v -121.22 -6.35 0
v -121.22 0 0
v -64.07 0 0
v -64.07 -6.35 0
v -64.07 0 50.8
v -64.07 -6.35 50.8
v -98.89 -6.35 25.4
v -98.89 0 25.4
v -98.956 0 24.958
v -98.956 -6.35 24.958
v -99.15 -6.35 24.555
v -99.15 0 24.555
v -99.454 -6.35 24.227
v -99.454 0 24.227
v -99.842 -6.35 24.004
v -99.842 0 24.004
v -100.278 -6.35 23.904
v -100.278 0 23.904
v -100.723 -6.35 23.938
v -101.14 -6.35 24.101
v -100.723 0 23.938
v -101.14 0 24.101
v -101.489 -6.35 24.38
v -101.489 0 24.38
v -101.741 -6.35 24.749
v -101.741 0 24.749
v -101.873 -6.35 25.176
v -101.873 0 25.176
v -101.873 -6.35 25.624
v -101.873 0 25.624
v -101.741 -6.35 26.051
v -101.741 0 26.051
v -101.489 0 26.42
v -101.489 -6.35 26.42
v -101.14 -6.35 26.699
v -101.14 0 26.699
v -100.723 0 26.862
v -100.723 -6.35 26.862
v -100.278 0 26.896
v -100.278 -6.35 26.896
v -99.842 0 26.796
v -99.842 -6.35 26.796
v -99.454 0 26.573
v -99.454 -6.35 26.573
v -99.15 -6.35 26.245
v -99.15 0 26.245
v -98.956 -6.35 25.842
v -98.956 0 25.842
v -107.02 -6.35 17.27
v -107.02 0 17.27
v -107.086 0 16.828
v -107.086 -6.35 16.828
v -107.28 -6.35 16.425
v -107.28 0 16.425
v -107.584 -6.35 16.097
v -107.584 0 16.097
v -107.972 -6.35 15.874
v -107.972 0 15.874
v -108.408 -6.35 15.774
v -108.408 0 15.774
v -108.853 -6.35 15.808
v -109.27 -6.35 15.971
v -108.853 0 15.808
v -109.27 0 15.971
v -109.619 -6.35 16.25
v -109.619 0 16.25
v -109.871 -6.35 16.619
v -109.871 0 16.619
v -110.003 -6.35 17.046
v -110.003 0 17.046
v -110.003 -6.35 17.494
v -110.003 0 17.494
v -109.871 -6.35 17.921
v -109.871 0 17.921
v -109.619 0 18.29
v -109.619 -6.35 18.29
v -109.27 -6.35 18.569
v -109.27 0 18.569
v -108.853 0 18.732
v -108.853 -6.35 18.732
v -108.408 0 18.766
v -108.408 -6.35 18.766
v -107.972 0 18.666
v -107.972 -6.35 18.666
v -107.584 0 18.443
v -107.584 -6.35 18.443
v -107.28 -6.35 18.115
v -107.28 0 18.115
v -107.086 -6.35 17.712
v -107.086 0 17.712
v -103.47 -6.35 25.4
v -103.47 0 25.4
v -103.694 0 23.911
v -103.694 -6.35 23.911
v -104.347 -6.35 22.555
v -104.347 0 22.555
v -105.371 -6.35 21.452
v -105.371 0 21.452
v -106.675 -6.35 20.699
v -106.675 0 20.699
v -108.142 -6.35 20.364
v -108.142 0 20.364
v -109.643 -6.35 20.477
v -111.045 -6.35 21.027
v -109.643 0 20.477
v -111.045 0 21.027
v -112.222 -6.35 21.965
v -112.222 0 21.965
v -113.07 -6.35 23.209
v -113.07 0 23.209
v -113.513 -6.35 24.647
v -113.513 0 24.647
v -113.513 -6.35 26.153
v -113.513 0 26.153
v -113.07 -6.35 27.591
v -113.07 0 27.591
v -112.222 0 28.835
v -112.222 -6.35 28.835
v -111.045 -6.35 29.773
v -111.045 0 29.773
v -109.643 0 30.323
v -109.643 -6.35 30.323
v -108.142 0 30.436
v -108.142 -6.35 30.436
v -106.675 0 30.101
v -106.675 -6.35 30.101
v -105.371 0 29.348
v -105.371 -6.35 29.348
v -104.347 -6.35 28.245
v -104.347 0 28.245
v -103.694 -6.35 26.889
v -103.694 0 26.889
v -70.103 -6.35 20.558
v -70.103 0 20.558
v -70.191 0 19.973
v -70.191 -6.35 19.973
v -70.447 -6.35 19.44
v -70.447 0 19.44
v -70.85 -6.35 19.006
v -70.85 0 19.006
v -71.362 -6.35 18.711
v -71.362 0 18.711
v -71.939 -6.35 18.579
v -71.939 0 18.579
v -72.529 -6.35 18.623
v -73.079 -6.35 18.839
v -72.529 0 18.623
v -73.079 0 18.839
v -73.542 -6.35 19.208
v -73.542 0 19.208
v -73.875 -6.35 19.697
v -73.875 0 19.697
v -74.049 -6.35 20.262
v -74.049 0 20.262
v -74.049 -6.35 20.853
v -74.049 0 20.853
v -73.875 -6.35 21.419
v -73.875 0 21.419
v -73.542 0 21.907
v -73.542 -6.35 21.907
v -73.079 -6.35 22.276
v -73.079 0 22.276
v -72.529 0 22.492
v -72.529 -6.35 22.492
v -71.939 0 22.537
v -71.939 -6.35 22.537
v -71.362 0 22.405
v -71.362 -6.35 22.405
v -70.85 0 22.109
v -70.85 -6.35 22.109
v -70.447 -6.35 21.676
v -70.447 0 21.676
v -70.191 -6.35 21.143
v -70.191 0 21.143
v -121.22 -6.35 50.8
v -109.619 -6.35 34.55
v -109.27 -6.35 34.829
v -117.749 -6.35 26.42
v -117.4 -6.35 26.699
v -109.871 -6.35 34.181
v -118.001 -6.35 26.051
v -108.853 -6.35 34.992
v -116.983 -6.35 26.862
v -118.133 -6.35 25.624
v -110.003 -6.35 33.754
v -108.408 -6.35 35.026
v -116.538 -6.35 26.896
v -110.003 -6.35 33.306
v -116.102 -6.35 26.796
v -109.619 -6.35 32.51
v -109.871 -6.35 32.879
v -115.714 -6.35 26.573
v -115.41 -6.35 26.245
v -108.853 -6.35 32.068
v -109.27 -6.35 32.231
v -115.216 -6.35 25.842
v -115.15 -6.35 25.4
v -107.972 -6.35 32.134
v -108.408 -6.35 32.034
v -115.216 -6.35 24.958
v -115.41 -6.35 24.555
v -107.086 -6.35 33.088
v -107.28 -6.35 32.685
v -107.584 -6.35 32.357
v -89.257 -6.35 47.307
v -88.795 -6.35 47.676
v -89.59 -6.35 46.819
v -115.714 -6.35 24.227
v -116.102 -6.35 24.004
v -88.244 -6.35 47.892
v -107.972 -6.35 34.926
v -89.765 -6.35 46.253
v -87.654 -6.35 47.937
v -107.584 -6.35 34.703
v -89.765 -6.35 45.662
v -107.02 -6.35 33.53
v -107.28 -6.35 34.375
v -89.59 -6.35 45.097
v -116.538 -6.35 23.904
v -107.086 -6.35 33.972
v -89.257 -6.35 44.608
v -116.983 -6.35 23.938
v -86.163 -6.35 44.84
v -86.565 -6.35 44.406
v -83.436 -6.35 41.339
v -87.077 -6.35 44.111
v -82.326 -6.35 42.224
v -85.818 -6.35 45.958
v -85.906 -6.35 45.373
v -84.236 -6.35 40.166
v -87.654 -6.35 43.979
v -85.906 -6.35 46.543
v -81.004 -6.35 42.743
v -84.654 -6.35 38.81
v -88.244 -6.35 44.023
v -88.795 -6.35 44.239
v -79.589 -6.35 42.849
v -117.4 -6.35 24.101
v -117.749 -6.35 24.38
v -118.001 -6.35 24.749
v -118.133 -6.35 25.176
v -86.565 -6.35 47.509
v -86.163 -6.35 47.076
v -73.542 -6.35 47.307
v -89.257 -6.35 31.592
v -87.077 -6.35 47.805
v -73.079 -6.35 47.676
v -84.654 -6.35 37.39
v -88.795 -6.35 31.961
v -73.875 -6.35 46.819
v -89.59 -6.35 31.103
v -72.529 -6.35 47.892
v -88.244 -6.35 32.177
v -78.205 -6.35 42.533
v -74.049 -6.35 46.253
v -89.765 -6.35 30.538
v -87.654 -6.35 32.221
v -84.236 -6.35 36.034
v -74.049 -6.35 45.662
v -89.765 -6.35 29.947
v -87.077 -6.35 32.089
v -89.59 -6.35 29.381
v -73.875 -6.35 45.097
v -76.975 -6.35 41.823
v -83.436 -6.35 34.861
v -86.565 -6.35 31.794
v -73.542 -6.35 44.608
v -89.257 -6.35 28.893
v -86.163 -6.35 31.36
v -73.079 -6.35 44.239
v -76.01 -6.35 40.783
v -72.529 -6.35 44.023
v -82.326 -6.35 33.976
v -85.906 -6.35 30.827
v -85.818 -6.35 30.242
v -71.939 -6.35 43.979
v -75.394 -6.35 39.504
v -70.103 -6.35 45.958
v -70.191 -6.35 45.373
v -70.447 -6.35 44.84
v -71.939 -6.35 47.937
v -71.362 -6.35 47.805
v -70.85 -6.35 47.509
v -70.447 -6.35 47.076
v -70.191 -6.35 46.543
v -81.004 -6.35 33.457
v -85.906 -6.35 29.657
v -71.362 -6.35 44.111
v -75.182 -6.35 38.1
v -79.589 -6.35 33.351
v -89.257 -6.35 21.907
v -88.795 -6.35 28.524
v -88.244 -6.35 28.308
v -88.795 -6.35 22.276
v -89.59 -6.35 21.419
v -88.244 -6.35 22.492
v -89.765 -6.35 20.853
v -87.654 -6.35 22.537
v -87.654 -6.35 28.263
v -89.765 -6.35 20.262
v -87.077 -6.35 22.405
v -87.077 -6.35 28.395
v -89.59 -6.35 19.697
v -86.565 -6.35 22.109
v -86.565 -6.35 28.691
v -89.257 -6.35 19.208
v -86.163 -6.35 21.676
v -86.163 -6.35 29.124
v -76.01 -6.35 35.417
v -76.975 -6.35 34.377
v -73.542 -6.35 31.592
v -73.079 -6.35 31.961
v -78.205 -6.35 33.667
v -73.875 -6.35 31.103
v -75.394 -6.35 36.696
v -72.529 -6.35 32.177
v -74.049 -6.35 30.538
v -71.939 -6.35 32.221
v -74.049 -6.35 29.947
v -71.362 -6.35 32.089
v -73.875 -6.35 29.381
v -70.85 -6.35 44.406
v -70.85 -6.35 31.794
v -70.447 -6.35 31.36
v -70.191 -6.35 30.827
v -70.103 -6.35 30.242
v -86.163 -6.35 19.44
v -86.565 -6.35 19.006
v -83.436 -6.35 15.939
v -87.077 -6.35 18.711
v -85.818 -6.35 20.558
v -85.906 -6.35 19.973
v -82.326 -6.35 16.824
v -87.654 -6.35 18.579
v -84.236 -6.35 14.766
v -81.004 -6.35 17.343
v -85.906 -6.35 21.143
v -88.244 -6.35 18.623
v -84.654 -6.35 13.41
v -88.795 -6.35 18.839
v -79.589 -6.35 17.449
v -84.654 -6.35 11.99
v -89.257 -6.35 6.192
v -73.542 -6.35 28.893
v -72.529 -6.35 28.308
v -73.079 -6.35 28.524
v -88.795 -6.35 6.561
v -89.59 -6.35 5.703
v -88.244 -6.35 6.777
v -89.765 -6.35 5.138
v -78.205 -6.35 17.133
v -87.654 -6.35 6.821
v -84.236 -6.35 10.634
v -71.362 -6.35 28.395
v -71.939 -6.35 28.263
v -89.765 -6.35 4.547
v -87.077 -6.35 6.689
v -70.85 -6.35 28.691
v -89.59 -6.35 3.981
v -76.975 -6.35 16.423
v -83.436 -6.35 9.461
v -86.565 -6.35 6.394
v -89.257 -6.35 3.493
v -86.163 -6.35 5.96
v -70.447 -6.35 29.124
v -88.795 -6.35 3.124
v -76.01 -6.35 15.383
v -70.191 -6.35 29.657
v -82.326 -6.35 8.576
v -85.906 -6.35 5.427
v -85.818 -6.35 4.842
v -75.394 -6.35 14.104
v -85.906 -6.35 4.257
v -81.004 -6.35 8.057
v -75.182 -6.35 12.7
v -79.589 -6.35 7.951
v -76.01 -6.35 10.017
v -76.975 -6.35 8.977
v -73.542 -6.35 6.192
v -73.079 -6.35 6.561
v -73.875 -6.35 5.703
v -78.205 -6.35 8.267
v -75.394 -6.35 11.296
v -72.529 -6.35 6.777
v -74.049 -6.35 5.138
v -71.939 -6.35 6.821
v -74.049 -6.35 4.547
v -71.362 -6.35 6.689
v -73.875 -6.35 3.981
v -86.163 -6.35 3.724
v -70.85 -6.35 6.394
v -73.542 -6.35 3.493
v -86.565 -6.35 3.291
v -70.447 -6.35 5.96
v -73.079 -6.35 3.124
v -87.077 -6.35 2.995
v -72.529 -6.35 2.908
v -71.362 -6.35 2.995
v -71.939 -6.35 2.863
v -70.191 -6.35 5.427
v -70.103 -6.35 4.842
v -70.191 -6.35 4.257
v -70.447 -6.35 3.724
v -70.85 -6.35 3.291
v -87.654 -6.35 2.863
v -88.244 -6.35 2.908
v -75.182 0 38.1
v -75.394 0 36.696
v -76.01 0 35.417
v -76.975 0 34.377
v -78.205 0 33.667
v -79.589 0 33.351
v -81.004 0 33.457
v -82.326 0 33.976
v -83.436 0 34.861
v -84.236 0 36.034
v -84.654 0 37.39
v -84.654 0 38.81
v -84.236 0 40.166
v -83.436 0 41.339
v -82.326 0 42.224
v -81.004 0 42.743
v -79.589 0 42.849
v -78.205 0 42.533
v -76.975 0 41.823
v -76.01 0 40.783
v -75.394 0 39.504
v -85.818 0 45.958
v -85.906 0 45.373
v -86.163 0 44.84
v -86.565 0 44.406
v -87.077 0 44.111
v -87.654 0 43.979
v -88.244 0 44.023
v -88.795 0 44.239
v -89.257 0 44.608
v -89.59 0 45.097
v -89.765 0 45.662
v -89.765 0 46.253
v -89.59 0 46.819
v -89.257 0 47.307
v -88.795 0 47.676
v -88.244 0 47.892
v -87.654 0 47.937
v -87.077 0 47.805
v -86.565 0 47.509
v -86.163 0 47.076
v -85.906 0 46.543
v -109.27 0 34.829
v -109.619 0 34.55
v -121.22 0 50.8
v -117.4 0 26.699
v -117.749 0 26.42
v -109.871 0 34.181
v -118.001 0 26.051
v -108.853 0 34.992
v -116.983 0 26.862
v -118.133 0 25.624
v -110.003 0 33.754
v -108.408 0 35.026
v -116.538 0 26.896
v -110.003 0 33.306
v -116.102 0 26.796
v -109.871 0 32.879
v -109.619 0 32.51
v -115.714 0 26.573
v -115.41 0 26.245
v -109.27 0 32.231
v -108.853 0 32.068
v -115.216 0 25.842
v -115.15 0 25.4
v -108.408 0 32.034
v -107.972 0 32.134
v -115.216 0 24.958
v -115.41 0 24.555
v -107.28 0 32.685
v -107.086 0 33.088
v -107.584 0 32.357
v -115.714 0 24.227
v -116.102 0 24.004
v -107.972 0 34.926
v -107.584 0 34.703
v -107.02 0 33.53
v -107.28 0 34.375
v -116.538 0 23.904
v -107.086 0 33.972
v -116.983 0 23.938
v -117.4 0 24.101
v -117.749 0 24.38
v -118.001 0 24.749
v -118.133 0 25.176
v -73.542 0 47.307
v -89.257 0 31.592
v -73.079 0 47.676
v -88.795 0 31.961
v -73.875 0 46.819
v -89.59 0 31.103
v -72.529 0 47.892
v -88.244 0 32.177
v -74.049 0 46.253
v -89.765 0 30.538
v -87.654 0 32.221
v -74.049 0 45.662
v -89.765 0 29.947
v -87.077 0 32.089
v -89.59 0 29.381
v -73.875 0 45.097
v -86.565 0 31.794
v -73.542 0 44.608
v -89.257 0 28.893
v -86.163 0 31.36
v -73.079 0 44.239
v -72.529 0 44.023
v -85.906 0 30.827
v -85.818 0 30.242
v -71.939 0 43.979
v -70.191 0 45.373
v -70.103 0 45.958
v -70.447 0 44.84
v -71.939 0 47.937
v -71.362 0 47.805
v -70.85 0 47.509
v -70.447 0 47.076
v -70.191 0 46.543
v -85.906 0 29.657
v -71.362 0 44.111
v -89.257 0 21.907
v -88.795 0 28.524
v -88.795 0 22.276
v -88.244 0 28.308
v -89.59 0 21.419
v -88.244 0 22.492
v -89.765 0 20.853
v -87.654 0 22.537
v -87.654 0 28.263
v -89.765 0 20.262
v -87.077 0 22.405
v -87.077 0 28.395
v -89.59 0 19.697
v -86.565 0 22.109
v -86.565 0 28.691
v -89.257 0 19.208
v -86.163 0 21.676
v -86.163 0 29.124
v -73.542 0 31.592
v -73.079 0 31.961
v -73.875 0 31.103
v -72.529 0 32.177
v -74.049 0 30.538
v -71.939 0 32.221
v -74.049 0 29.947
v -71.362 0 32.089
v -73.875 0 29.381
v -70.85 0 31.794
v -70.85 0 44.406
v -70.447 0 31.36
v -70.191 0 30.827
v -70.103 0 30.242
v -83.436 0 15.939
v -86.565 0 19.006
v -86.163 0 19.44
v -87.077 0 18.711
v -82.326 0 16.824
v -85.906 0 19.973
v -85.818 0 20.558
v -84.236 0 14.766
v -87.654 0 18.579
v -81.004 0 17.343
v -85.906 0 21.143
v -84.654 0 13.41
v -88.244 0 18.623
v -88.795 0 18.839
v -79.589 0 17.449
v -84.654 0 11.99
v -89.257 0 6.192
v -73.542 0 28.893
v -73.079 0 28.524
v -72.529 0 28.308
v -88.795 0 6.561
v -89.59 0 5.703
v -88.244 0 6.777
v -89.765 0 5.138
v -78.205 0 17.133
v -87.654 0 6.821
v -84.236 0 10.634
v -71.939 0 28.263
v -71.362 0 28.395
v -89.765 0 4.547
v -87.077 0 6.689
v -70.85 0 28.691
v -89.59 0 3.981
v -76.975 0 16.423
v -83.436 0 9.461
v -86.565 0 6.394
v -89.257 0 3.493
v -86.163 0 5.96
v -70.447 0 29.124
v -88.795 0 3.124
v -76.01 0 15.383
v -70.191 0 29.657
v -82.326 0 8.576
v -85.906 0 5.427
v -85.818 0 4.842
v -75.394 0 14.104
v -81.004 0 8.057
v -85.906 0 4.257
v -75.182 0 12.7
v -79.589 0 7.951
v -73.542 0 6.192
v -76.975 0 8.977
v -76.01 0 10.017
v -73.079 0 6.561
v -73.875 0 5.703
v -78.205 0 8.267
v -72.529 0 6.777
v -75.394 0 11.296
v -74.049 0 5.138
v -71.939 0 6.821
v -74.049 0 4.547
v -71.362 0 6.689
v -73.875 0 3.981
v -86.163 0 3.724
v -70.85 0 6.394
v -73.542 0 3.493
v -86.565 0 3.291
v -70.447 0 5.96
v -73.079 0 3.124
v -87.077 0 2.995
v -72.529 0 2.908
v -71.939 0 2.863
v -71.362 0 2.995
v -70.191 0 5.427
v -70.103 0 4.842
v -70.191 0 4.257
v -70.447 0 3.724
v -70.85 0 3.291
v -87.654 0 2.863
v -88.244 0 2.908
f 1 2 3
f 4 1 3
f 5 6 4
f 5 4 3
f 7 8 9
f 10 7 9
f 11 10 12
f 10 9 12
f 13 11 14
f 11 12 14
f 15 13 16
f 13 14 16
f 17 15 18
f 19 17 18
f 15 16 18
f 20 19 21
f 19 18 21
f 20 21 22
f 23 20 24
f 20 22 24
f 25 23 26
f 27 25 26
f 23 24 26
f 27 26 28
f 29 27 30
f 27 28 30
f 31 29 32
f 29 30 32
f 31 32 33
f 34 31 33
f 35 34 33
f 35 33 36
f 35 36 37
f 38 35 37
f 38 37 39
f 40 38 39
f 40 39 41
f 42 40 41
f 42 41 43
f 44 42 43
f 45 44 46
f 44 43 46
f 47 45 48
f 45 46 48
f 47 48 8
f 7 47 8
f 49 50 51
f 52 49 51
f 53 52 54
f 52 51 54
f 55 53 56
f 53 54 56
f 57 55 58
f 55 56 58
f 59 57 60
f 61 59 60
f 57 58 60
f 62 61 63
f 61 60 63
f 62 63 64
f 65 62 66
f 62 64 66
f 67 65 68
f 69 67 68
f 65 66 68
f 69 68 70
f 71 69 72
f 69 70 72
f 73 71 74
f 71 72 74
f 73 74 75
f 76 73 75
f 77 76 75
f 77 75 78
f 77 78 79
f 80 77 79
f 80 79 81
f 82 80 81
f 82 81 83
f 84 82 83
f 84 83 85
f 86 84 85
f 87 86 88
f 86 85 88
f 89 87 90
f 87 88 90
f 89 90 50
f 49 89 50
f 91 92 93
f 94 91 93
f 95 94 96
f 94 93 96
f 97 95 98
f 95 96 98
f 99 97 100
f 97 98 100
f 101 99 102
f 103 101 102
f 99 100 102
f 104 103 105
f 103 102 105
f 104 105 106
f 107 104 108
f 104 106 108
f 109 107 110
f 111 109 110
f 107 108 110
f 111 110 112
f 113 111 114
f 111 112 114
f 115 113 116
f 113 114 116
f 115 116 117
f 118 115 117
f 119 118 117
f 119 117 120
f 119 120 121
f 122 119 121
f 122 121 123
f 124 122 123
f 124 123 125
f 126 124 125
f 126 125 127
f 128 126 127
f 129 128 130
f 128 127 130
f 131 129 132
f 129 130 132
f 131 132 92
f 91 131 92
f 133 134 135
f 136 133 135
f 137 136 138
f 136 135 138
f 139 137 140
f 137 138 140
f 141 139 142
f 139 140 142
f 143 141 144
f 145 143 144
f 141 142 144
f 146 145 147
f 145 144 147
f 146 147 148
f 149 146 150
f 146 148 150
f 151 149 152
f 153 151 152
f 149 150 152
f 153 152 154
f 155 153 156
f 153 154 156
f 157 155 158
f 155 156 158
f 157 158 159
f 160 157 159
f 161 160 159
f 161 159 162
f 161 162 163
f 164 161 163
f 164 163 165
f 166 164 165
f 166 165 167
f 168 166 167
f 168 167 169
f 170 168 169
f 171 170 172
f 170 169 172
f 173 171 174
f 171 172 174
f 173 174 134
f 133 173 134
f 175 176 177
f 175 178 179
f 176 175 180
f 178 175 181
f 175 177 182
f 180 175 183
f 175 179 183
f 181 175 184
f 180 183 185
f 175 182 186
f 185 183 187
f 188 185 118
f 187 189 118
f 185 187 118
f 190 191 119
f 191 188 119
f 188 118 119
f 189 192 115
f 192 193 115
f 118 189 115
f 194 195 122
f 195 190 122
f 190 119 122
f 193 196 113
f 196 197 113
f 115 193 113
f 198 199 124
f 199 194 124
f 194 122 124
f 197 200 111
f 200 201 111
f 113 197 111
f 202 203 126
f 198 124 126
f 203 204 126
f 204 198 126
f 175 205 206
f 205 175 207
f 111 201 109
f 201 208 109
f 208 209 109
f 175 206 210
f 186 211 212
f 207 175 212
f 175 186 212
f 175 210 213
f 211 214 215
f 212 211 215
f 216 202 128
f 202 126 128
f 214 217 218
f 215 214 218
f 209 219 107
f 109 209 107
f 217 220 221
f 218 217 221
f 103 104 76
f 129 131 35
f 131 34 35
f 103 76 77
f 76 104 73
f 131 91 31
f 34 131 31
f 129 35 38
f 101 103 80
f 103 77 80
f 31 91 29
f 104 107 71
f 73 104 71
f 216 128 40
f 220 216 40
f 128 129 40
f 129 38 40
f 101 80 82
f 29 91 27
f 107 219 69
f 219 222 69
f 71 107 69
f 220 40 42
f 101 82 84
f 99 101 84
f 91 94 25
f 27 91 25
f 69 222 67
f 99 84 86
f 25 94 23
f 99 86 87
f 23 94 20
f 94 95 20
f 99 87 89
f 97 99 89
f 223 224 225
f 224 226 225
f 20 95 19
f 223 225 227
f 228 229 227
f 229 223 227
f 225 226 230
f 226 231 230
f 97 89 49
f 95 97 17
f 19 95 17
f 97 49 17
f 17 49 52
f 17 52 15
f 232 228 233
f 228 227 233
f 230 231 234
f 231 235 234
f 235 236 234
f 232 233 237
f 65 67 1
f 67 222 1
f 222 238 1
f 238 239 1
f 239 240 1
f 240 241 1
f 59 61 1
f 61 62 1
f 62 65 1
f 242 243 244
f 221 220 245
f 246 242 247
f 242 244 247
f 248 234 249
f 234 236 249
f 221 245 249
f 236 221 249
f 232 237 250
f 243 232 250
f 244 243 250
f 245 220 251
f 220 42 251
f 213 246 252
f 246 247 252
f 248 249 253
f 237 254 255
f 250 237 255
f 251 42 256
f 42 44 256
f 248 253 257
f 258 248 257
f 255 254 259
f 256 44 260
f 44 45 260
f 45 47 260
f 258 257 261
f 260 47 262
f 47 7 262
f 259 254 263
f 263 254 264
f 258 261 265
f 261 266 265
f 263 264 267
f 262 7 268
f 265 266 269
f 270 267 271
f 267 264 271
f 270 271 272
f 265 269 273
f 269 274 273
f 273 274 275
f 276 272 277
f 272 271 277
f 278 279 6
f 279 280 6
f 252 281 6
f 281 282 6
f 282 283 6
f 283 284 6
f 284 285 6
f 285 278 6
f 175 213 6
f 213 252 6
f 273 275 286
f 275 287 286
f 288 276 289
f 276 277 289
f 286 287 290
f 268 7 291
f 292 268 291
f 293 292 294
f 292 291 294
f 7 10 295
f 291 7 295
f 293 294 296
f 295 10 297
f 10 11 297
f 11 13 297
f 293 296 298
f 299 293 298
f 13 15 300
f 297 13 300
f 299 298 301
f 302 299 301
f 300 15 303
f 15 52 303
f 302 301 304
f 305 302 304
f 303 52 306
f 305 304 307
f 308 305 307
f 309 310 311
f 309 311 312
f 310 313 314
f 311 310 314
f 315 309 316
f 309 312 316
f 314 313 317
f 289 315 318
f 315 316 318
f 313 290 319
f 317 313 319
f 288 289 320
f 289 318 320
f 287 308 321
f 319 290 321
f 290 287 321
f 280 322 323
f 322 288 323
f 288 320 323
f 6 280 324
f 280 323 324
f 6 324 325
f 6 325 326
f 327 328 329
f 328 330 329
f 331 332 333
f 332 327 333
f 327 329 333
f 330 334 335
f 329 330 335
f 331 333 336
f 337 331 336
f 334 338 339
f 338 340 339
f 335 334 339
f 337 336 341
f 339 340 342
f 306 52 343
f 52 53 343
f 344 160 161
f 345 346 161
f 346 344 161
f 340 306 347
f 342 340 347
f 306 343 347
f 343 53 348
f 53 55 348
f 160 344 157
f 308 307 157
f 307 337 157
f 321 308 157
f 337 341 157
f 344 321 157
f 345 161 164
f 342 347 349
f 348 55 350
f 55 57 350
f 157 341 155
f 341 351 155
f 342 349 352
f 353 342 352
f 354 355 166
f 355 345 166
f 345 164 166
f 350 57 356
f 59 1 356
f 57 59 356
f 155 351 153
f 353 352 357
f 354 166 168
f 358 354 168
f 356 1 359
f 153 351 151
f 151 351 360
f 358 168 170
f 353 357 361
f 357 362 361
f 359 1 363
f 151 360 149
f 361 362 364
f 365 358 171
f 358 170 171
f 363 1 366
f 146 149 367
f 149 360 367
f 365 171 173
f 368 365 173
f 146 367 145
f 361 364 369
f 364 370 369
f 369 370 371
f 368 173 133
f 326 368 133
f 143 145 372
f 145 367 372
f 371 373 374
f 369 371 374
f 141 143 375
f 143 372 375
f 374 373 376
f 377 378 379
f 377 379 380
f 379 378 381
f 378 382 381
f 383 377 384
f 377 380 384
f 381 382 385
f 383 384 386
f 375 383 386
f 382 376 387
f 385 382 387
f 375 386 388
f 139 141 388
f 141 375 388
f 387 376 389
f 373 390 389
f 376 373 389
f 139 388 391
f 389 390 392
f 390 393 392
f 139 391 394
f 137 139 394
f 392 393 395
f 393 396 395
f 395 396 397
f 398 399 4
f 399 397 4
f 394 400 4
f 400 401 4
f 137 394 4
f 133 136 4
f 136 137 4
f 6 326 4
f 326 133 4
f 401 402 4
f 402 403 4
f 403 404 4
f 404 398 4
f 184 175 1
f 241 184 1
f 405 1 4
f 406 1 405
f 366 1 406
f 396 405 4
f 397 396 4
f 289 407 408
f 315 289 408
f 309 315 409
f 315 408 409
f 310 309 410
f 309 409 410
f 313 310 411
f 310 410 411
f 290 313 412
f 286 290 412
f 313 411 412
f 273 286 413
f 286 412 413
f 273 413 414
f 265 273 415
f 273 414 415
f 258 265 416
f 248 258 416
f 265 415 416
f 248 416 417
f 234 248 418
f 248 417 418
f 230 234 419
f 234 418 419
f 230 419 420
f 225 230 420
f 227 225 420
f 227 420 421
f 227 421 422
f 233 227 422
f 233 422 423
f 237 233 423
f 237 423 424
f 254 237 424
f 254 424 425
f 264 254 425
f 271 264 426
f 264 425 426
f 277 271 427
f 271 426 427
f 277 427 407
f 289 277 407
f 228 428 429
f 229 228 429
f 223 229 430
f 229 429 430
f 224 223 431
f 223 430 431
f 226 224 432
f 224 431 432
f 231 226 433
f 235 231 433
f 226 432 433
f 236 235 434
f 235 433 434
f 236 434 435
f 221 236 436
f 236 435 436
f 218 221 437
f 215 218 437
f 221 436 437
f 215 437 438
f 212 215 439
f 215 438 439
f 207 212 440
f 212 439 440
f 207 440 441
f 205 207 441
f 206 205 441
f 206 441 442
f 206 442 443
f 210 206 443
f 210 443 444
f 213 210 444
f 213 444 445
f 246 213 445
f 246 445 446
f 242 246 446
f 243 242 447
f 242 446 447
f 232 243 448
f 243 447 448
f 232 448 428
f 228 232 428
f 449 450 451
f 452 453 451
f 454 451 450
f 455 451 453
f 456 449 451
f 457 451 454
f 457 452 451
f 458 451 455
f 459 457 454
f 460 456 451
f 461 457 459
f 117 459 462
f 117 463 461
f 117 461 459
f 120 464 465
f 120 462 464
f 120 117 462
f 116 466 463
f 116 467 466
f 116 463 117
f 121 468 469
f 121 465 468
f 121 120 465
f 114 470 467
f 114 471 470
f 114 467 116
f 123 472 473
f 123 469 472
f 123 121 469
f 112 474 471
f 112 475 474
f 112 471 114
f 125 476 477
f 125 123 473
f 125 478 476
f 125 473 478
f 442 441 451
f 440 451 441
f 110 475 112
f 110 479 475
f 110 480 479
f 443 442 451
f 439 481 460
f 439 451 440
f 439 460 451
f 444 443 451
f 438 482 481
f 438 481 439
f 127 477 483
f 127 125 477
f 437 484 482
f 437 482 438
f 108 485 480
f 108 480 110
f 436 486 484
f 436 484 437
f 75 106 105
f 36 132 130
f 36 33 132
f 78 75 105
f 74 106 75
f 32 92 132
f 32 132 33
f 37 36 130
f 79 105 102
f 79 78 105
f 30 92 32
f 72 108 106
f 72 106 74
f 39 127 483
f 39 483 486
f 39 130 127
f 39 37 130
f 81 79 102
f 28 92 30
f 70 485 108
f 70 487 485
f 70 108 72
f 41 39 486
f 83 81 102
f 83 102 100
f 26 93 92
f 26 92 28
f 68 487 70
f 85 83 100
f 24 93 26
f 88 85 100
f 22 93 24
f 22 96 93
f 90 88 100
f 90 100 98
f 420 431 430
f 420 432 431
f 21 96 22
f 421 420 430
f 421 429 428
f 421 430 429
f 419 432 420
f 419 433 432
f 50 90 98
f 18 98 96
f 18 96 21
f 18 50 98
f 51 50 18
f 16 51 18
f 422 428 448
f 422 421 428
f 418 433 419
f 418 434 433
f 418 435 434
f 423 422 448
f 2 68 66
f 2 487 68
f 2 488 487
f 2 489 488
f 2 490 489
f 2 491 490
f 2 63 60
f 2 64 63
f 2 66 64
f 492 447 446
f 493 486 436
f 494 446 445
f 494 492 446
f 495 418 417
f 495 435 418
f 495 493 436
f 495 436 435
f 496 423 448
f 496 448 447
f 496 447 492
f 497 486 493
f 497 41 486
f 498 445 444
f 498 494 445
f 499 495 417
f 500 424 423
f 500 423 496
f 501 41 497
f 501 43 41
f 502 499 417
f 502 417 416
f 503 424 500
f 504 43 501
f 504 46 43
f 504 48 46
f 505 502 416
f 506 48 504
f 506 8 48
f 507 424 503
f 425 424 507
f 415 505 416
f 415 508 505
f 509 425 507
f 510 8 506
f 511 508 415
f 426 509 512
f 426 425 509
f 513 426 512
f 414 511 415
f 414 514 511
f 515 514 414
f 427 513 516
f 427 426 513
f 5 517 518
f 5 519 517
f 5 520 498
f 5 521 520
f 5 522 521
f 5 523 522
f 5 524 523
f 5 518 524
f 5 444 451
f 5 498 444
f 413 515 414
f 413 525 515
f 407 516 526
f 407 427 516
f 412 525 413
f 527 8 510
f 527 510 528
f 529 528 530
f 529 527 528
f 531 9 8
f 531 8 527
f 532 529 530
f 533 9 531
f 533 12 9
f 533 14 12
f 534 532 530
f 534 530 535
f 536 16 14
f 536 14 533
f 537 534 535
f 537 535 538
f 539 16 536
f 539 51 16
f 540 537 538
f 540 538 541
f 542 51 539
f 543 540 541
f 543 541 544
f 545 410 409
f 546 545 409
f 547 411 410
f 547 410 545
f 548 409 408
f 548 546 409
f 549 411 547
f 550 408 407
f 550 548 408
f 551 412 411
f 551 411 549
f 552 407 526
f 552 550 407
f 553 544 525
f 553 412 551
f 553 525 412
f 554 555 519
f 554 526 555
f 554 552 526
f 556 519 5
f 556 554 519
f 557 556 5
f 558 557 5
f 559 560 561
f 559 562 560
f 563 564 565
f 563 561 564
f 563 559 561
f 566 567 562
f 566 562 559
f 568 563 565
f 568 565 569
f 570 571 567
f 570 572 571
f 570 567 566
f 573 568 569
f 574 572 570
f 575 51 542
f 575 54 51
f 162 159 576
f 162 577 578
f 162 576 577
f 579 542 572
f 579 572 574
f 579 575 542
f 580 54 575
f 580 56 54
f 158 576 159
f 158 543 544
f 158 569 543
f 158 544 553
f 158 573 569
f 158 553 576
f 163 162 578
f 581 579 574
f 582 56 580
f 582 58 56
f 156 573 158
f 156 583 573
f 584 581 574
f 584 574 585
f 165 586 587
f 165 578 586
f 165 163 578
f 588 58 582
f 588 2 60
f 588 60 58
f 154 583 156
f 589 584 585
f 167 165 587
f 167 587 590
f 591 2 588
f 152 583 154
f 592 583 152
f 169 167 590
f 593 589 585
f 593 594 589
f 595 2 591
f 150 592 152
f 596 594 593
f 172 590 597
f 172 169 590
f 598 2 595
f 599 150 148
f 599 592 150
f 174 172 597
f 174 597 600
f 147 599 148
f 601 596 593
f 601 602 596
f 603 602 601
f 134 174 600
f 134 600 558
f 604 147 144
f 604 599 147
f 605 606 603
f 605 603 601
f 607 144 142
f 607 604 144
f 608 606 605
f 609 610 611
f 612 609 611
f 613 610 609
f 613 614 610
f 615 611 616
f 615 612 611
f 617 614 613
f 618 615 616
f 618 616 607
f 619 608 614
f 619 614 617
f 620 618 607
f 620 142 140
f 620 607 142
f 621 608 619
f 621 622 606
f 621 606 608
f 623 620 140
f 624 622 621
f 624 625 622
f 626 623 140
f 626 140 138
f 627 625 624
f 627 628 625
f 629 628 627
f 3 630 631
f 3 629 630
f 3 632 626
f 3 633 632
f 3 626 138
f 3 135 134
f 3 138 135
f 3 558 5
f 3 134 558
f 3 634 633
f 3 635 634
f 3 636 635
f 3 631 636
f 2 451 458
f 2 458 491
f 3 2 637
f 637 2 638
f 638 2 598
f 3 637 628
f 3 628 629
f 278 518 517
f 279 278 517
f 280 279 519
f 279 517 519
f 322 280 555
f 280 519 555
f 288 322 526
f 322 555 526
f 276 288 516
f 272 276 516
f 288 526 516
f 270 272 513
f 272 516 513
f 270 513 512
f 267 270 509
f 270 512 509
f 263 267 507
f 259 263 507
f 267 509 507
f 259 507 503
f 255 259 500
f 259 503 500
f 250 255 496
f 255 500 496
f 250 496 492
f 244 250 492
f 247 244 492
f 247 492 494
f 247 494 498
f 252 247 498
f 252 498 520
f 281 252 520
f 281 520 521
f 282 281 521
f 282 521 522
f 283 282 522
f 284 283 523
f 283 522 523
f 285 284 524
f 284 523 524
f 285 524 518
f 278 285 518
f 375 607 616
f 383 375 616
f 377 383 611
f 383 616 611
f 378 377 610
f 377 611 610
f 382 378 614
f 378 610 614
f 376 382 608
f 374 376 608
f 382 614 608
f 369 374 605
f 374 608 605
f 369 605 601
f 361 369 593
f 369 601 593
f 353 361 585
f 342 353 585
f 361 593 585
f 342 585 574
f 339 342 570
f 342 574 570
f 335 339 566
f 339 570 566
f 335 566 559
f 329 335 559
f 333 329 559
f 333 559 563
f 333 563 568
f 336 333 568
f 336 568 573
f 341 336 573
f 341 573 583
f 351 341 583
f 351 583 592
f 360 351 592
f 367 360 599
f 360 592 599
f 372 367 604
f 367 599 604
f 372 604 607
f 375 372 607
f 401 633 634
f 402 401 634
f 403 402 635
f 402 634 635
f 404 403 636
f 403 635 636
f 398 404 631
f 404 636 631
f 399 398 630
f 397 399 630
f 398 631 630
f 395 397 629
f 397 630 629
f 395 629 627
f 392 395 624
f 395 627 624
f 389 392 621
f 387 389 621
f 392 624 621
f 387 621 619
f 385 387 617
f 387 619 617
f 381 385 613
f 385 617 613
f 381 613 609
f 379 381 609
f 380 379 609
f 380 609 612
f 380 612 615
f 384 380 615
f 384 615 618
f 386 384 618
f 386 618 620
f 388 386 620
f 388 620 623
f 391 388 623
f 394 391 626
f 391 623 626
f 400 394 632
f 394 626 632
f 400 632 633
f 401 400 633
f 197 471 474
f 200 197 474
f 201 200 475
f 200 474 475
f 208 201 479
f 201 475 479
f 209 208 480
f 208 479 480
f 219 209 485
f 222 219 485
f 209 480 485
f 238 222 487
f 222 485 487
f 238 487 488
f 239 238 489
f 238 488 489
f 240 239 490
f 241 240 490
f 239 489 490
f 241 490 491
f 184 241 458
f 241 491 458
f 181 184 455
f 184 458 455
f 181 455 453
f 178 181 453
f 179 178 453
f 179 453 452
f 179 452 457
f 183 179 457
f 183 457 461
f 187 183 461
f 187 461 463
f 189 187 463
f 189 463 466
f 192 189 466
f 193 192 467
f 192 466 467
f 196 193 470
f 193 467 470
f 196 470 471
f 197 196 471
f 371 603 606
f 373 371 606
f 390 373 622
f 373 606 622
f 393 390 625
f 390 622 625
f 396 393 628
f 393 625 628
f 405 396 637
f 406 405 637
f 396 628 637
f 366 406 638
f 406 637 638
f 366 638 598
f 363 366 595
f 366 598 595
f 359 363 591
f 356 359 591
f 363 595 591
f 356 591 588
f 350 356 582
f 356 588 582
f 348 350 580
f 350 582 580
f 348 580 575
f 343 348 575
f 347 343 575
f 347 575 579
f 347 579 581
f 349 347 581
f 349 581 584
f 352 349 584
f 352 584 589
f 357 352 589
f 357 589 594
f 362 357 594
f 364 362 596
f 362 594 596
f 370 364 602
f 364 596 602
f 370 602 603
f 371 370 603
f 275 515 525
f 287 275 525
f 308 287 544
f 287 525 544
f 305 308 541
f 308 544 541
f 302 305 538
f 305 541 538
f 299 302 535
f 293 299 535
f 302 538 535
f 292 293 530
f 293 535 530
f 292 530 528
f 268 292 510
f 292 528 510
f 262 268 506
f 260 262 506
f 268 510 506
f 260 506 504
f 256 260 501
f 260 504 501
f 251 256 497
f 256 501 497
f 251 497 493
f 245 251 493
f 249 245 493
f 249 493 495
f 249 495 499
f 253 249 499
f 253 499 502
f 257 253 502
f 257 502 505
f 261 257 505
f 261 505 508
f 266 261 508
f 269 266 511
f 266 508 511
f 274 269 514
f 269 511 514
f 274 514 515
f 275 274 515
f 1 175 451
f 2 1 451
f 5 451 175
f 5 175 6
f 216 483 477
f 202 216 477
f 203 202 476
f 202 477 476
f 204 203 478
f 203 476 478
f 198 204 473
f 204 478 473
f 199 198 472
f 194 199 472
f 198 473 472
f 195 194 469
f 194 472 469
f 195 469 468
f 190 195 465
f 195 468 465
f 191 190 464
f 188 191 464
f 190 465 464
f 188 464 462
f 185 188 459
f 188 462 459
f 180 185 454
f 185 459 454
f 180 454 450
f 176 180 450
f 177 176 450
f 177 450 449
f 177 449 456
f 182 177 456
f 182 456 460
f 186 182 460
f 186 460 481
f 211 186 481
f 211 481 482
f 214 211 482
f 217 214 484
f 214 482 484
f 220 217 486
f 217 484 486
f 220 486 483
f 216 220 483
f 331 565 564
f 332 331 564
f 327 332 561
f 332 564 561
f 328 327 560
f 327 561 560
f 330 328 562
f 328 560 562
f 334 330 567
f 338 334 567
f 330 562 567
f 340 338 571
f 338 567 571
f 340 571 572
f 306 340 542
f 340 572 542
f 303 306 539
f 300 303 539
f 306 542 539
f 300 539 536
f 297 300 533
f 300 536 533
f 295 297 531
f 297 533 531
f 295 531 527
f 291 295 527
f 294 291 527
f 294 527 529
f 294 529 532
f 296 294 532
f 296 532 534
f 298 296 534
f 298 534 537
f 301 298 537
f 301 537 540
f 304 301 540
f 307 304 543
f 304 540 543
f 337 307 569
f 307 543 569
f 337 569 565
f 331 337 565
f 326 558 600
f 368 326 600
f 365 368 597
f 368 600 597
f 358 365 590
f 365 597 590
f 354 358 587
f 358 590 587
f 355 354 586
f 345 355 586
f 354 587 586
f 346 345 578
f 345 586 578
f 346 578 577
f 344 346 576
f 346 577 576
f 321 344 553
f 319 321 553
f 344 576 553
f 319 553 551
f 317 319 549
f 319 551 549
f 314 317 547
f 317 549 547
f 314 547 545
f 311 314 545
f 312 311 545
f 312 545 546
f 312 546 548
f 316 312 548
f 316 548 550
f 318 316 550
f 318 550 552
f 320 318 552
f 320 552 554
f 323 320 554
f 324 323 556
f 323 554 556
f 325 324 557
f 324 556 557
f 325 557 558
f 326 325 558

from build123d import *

# Parameters (mm, degrees)
SKETCH3_W           = 57.15
SKETCH3_H           = 6.35
BOSS_EXTRUDE2_DEPTH = 50.8
SKETCH4_R           = 5.05
SKETCH4_R_2         = 4.7625
SKETCH4_R_3         = 1.5
SKETCH4_R_4         = 1.984375
CUT_EXTRUDE1_DEPTH  = 6.35


with BuildPart() as part:
    # Sketch3 → Boss-Extrude2 (new body)
    with BuildSketch(Plane.XY):
        with Locations((-92.644673345, -3.175)):
            Rectangle(SKETCH3_W, SKETCH3_H)
    extrude(amount=BOSS_EXTRUDE2_DEPTH)

    # Sketch4 → Cut-Extrude1 (cut)
    with BuildSketch(Plane(origin=(0, 0, 0), x_dir=(1, 0, 0), z_dir=(0, 1, 0))):
        with Locations((-108.519673345, -25.4)):
            Circle(SKETCH4_R)
        with Locations((-79.944673345, -38.1)):
            Circle(SKETCH4_R_2)
        with Locations((-108.519673345, -17.27)):
            Circle(SKETCH4_R_3)
        with Locations((-87.802397451, -30.242275894)):
            Circle(SKETCH4_R_4)
        with Locations((-72.086949239, -30.242275894)):
            Circle(SKETCH4_R_4)
        with Locations((-72.086949239, -45.957724106)):
            Circle(SKETCH4_R_4)
        with Locations((-87.802397451, -45.957724106)):
            Circle(SKETCH4_R_4)
        with Locations((-116.649673345, -25.4)):
            Circle(SKETCH4_R_3)
        with Locations((-100.389673345, -25.4)):
            Circle(SKETCH4_R_3)
        with Locations((-108.519673345, -33.53)):
            Circle(SKETCH4_R_3)
        with Locations((-87.802397451, -4.842275894)):
            Circle(SKETCH4_R_4)
        with Locations((-72.086949239, -4.842275894)):
            Circle(SKETCH4_R_4)
        with Locations((-72.086949239, -20.557724106)):
            Circle(SKETCH4_R_4)
        with Locations((-87.802397451, -20.557724106)):
            Circle(SKETCH4_R_4)
        with Locations((-79.944673345, -12.7)):
            Circle(SKETCH4_R_2)
    extrude(amount=-CUT_EXTRUDE1_DEPTH, mode=Mode.SUBTRACT)


solid = part.part
